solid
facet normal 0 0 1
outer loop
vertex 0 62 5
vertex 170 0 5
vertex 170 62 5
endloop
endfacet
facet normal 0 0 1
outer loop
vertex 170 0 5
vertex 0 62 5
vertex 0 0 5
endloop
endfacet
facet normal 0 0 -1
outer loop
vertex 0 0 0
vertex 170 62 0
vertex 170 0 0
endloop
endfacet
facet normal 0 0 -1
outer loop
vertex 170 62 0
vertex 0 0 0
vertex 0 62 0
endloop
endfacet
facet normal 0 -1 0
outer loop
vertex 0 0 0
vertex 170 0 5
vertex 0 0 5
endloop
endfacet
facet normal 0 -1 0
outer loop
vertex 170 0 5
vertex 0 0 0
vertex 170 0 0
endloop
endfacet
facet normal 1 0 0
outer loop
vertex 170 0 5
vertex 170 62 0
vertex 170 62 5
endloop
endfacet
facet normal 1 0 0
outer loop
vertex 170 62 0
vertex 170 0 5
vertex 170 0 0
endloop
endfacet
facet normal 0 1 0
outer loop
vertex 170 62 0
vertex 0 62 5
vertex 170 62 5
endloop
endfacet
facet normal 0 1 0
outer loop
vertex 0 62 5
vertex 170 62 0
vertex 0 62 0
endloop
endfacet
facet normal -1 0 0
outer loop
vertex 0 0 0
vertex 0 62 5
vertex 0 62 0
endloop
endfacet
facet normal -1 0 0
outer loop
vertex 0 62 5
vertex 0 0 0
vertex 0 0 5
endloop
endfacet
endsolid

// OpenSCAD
module body(
    body_length,
    body_width ,
    body_thicc 
) {
    cube([body_length, body_width, body_thicc]);
}

body(
    170,
     62,
      5
);
